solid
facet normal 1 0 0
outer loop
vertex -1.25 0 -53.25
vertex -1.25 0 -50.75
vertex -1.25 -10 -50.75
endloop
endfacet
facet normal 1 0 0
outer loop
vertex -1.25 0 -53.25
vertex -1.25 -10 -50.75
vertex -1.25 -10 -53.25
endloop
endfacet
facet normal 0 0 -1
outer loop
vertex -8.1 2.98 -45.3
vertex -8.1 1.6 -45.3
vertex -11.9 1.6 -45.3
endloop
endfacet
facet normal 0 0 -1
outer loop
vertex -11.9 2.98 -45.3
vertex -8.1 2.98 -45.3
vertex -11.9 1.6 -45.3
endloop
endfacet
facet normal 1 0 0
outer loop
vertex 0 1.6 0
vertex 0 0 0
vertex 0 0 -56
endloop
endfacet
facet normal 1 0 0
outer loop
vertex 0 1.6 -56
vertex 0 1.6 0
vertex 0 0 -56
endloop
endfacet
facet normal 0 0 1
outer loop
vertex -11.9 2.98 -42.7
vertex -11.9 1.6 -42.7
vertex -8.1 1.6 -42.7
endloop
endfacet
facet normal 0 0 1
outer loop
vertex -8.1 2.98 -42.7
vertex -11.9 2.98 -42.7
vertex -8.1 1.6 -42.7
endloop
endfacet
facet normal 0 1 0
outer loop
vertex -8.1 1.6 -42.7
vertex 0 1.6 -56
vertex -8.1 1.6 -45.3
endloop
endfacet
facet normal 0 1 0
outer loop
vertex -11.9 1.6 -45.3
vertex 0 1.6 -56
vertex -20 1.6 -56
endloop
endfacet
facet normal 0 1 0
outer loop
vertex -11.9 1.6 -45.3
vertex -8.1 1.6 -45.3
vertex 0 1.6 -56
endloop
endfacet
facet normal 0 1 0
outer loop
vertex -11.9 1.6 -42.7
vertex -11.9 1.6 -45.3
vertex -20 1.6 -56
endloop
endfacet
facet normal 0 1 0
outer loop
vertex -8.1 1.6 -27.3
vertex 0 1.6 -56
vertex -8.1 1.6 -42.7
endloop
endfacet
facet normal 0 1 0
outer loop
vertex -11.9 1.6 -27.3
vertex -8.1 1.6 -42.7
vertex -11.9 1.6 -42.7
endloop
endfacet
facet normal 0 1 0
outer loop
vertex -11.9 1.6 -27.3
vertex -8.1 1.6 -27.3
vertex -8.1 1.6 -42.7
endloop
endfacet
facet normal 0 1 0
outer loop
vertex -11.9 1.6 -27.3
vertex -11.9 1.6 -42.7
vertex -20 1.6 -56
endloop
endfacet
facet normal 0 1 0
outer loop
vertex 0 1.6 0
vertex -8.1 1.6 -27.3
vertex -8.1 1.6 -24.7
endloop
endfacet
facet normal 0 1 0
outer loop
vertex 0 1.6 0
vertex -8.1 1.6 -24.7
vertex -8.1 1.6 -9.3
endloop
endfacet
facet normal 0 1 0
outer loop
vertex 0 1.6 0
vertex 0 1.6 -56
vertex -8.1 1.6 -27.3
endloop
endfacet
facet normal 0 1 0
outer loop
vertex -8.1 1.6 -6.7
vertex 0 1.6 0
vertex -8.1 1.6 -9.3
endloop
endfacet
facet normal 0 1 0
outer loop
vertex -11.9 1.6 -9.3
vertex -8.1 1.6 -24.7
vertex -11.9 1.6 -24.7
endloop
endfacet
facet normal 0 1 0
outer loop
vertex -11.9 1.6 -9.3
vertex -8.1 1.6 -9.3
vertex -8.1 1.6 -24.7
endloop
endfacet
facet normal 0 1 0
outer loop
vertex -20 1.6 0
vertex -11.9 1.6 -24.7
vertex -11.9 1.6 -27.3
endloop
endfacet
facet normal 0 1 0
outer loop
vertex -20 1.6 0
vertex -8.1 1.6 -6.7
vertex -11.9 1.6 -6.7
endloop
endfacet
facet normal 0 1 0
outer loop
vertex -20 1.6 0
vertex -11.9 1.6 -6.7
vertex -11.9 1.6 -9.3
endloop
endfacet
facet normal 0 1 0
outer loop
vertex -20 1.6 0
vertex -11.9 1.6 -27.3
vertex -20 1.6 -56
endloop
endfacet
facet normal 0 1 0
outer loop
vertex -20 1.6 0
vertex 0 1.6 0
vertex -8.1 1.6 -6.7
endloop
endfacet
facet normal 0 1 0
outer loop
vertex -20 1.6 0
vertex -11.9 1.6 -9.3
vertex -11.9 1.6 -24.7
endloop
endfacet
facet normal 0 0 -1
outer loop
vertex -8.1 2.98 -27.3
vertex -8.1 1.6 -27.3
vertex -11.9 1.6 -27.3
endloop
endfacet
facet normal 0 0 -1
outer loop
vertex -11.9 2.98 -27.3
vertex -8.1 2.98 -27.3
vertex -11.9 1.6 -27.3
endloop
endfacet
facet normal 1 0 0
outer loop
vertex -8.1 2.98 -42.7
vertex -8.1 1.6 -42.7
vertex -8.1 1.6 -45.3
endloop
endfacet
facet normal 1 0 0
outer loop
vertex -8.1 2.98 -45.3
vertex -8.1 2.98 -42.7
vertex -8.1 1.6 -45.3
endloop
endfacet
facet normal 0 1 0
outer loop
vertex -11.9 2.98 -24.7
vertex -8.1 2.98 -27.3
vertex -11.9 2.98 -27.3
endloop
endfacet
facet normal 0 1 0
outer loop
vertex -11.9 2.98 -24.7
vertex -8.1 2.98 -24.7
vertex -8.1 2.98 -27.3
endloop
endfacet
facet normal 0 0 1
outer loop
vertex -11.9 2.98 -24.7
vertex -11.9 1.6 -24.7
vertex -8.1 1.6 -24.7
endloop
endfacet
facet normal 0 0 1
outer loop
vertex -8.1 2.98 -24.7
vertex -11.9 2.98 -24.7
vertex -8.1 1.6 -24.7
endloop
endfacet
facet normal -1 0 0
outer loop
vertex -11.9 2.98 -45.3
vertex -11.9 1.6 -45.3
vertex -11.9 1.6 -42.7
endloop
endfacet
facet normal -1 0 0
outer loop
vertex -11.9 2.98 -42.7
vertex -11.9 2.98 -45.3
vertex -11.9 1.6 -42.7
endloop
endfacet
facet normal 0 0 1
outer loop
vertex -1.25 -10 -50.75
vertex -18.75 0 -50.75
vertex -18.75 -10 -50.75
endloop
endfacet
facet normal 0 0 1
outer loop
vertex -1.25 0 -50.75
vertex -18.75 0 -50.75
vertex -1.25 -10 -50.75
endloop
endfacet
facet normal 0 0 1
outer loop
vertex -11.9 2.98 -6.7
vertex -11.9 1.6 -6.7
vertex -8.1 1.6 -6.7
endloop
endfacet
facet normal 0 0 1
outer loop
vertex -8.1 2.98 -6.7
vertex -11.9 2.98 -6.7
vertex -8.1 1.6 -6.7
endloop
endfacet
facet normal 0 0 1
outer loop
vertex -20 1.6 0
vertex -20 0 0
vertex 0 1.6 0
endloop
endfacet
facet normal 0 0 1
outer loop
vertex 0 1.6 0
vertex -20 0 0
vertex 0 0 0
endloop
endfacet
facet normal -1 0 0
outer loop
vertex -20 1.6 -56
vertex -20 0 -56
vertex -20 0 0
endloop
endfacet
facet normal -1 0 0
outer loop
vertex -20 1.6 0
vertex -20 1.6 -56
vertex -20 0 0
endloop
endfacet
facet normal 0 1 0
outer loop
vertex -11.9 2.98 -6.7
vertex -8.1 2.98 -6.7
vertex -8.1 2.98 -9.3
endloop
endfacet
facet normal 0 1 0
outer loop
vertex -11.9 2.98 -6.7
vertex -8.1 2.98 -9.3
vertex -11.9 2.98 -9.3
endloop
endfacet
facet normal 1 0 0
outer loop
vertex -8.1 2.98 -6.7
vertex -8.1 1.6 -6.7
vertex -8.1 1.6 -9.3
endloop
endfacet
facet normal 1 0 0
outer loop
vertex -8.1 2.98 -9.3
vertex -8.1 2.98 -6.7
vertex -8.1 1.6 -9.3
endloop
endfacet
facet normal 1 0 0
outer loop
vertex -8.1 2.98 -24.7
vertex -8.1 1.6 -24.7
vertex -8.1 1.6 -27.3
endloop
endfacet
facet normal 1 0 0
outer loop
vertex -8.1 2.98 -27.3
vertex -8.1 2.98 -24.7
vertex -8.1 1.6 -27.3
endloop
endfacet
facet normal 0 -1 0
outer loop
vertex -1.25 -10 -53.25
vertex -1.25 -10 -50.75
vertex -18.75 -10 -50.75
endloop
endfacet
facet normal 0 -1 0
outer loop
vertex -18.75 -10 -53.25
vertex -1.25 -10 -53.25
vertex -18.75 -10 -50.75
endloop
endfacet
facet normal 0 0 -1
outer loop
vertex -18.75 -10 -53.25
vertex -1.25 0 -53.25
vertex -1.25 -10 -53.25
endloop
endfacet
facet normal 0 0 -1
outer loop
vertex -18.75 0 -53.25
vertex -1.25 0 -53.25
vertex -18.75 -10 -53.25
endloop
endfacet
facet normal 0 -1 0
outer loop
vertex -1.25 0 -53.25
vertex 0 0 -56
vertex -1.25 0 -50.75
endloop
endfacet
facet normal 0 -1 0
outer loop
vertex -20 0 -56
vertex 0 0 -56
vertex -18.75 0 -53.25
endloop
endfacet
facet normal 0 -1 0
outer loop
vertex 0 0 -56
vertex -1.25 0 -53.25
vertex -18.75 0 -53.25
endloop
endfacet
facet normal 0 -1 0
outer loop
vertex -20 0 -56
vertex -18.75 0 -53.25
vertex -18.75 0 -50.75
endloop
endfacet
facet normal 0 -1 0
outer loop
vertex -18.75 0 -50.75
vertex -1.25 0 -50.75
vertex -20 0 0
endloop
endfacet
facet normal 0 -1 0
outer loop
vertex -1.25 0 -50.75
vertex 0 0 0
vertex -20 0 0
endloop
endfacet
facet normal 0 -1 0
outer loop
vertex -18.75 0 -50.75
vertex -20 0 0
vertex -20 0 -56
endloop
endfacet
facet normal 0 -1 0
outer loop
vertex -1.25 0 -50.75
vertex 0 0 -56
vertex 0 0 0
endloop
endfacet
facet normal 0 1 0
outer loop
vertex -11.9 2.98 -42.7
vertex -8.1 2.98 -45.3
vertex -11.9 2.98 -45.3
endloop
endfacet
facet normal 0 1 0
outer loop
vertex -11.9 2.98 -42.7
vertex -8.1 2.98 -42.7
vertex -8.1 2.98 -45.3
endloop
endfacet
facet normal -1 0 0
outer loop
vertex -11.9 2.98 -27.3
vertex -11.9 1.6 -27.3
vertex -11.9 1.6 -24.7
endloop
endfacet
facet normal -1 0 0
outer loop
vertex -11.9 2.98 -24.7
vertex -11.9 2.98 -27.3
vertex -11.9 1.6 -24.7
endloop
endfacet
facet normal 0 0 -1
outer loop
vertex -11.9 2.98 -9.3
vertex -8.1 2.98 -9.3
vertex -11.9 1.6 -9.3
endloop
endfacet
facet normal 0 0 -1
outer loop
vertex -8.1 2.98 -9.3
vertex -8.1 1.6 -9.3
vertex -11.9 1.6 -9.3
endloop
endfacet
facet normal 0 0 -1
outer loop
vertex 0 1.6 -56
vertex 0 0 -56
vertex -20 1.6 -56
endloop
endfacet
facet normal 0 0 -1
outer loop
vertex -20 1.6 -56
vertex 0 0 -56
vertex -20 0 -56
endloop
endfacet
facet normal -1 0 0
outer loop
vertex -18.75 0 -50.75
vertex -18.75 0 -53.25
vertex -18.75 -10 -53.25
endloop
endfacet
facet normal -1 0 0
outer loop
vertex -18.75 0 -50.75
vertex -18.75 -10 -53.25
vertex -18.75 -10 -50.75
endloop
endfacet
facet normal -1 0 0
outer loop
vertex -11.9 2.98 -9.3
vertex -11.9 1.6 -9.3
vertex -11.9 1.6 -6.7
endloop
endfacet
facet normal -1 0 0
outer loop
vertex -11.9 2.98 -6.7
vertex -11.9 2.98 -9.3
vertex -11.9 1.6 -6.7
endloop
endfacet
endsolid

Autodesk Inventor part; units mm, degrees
ref_plane "YZ Plane" through (0, 0, 0) normal (1, 0, 0) x (0, 1, 0)
ref_plane "XZ Plane" through (0, 0, 0) normal (0, 1, 0) x (-1, 0, 0)
ref_plane "XY Plane" through (0, 0, 0) normal (0, 0, 1) x (1, 0, 0)
sketch "Sketch2" plane through (0, 0, 0) normal (0, 1, 0) x (-1, 0, 0)
  line L0 (20, 0) -> (0, 0)
  line L1 (0, 0) -> (0, -56)
  line L2 (0, -56) -> (20, -56)
  line L3 (20, -56) -> (20, 0)
  line L4 (18.75, -50.75) -> (1.25, -50.75)
  line L5 (1.25, -50.75) -> (1.25, -53.25)
  line L6 (1.25, -53.25) -> (18.75, -53.25)
  line L7 (18.75, -53.25) -> (18.75, -50.75)
  line L8 (11.9, -6.7) -> (8.1, -6.7)
  line L9 (8.1, -6.7) -> (8.1, -9.3)
  line L10 (8.1, -9.3) -> (11.9, -9.3)
  line L11 (11.9, -9.3) -> (11.9, -6.7)
  line L12 (11.9, -42.7) -> (8.1, -42.7)
  line L13 (8.1, -42.7) -> (8.1, -45.3)
  line L14 (8.1, -45.3) -> (11.9, -45.3)
  line L15 (11.9, -45.3) -> (11.9, -42.7)
  line L16 (8.1, -27.3) -> (11.9, -27.3)
  line L17 (8.1, -24.7) -> (8.1, -27.3)
  line L18 (11.9, -24.7) -> (8.1, -24.7)
  line L19 (11.9, -27.3) -> (11.9, -24.7)
  line L20 (23.6892, -52) -> (-2.3247, -52) construction
  line L21 (10, -54.7987) -> (10, -48.1542) construction
  line L22 (10, 9.3713) -> (10, -46.1174) construction
  line L23 (11.7769, -8) -> (1.25, -8) construction
  line L24 (11.7769, -26) -> (1.25, -26) construction
  line L25 (11.7769, -44) -> (1.25, -44) construction
  dimension "d0" = 20
  dimension "d1" = 56
  dimension "d2" = 17.5
  dimension "d3" = 2.5
  dimension "d9" = 3.8
  dimension "d10" = 2.6
  dimension "d13" = 3.8
  dimension "d14" = 2.6
  dimension "d30" = 3.8
  dimension "d31" = 2.6
  dimension "d40" = 10
  dimension "d41" = 10
  dimension "d45" = 8.1
  dimension "d46" = 8
  dimension "d47" = 18
  dimension "d48" = 18
  dimension "d49" = 4
extrude "Extrusion1" add sketch "Sketch2" along normal blind 1.6 contours L3 L2 L1 L0 | L7 L6 L5 L4 | L11 L10 L9 L8 | L15 L14 L13 L12 | L17 L18 L19 L16
extrude "Extrusion3" add sketch "Sketch2" against normal blind 10 contours L7 L6 L5 L4
extrude "Extrusion4" add sketch "Sketch2" along normal blind 2.98 contours L11 L10 L9 L8 | L15 L14 L13 L12 | L17 L18 L19 L16
properties part number "Sensor_Board_dummy"
